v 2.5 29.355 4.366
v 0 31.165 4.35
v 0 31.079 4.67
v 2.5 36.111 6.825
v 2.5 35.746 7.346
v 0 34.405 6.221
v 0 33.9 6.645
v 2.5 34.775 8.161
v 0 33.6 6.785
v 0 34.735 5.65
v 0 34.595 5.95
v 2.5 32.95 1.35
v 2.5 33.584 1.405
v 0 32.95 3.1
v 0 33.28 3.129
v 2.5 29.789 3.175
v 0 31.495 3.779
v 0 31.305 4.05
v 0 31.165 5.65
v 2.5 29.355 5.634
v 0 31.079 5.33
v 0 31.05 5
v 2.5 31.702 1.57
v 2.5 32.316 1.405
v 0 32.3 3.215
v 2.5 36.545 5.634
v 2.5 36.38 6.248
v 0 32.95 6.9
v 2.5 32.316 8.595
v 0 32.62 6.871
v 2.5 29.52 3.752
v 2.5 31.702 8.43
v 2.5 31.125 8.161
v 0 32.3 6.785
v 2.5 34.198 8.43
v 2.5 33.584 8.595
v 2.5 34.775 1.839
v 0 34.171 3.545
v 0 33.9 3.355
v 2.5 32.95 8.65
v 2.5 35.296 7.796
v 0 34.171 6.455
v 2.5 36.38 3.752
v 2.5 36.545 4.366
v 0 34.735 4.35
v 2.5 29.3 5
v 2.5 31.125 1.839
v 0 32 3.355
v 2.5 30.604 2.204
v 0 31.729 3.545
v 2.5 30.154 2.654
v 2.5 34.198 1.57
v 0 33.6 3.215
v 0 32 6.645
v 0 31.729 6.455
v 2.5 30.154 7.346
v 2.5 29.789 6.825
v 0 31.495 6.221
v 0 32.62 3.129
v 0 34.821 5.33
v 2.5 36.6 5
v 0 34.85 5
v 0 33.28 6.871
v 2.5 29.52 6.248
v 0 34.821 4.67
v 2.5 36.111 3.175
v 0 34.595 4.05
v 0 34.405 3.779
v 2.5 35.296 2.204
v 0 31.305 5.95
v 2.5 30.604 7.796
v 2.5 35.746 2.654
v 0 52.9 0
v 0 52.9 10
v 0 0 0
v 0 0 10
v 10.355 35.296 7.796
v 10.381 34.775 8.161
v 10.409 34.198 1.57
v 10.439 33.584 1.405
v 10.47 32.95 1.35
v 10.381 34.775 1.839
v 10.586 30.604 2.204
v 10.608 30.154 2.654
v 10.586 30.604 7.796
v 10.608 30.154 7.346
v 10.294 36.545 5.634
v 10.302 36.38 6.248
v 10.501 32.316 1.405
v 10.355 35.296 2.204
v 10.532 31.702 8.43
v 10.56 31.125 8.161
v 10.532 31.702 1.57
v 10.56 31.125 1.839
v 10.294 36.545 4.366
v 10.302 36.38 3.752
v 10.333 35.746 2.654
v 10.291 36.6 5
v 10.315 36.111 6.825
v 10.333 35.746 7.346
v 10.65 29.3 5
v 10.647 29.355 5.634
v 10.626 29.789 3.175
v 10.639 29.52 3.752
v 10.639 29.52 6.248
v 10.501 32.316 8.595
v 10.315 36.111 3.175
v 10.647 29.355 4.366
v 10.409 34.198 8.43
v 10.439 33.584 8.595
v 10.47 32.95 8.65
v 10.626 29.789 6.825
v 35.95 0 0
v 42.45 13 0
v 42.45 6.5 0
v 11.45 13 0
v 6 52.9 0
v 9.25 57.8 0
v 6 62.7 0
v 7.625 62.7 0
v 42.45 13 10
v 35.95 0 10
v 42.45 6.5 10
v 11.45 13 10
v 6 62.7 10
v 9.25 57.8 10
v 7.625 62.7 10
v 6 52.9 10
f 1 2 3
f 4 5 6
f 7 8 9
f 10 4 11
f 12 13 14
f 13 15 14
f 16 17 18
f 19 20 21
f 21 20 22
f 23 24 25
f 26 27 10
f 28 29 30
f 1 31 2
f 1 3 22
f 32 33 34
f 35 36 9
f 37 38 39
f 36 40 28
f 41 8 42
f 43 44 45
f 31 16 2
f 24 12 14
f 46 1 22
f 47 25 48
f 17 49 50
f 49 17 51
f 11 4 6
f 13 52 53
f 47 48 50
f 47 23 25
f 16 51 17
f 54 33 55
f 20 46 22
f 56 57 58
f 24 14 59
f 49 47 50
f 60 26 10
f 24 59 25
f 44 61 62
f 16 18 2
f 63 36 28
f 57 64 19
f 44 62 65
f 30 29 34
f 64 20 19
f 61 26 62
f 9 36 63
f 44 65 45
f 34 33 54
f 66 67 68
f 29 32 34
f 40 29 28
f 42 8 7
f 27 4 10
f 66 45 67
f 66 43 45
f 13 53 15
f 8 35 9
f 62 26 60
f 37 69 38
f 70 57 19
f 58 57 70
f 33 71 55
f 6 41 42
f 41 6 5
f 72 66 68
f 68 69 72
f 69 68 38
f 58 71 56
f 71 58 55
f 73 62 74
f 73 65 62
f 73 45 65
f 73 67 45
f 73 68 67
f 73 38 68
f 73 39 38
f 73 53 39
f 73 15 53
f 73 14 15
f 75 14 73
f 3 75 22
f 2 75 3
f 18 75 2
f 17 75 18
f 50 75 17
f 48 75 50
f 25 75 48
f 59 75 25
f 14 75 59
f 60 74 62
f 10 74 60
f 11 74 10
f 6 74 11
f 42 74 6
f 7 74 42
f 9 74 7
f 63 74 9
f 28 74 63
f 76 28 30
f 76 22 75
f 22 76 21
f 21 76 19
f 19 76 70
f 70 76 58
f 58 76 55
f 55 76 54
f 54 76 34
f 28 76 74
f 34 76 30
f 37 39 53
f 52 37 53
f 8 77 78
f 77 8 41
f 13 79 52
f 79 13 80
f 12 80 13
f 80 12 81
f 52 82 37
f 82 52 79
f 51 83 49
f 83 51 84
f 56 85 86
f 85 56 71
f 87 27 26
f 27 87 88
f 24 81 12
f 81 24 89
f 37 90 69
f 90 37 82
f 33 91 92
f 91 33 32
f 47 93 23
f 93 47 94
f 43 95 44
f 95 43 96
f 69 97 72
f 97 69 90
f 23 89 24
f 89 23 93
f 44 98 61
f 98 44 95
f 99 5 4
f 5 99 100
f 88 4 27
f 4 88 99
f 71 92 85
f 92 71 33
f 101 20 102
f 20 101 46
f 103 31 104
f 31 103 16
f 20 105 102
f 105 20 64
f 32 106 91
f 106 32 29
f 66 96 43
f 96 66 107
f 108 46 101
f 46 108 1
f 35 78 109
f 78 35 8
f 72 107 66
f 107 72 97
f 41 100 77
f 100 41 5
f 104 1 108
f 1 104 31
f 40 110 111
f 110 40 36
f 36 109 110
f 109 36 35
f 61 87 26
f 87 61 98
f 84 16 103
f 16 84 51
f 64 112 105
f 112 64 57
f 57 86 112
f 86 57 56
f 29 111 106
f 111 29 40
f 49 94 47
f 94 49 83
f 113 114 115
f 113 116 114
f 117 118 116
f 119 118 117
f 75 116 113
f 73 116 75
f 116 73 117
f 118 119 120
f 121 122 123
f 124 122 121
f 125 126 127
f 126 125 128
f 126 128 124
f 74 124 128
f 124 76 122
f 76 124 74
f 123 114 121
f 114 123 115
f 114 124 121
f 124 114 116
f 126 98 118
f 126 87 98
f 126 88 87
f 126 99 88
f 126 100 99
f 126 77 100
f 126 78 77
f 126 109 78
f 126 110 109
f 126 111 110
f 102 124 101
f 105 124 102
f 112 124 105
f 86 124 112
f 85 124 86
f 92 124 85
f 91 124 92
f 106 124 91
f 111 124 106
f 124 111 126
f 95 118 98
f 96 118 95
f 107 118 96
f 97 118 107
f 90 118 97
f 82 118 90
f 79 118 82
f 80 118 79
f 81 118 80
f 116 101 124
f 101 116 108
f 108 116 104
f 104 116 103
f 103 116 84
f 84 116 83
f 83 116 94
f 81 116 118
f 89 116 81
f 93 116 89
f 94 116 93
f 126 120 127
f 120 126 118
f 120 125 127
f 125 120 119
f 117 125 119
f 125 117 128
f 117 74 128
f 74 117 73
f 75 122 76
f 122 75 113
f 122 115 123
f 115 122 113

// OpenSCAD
/*
————————————————————————————————————————————————————————————————————————————————
CONFIG
————————————————————————————————————————————————————————————————————————————————
*/

// bin measurements (draw technincal image)
binHeight = 52;
binWidth = 102;
binLength = 93;
binLengthBackFloorOffset = 2.2; // should be angle. 0 for straight.

// Chanfer of the bin
binChanferHeight = 7.5;
binChanferHeightThickness = 2.3;
binChanferLengthThickness = 3;
binChanferLengthInternal = 6.5 - binChanferLengthThickness;
binChanferWidth = 10; // 70; // should be minor than binWidth

// Holes
screwHeadDiameter = 6.8;
screwHeadHeight = 2.5; // 0 for flat, > 0 for conical head
screwShankDiameter = 3.3;
screwShankLength = 0;
screwSpacing = 0.25; // extra space for the screw hole
screwQuantity = [1, 1];

// Misc
$fn=360 / 10;
renderTransp = 1;
renderColorPolygon = "blue";
renderColorHoles = "red";
// bleedOffset = 0.25; // tolerance

// Auto-calculated, minor measurements
originX = 0;
originY = 0;
baseHeight = binHeight / 4;
supportChanferHoleLengthAdditional = binChanferLengthThickness * 1;
supportChanferTeethSafeLengthIncrease = 0.25;
supportChanferTeethLengthOffset = 5; // should be angle. 0 for straight.
supportBaseLength = binLength / 3;




/*
————————————————————————————————————————————————————————————————————————————————
MODULES
————————————————————————————————————————————————————————————————————————————————
*/

module start(){
	echo("Script start");

	// Axis indexes
	xA = originX;
	xB = xA;

	xC = xA + binChanferLengthThickness + supportChanferHoleLengthAdditional;
	xD = xC;
	xF = xC + binChanferLengthInternal - supportChanferTeethSafeLengthIncrease;
	xE = xF - ( ( binChanferLengthInternal - supportChanferTeethSafeLengthIncrease ) / 2);
	xG = xF + binLengthBackFloorOffset;
	xH = xG + supportBaseLength;
	xI = xH;
	xJ = xH - (baseHeight / 2);

	yA = originY;
	yJ = yA;
	yH = yA + baseHeight;
	yG = yH;
	yI = yA + yH - (baseHeight / 2);
	yD = yA + baseHeight + binHeight - binChanferHeightThickness;
	yE = yD;
	yB = yD - binChanferHeight - binChanferHeightThickness;
	yC = yB;
	yF = yC + ( (yD - yC) / 2 ); // 
	echo("Axis indexes generated");

	// drawing vector
	dv = [
		[xA, yA],
		[xB, yB],
		[xC, yC],
		[xD, yD],
		[xE, yE],
		[xF, yF],
		[xG, yG],
		[xH, yH],
		[xI, yI],
		[xJ, yJ],
	];
	echo("Drawing vector done");


	// screw holes
	sxA = originX;
	sxB = sxA + screwShankLength;
	sxC = sxB + screwHeadHeight;
	sxD = xG;

	screwQuantityHorizontal = screwQuantity[0] > 0 ? screwQuantity[0] : 0;
	holeHorizontalSpacing = binChanferWidth / (screwQuantityHorizontal + 1);

	holeVerticalOrigin = yG;
	holeVerticalEnd = yB;
	screwQuantityVertical = screwQuantity[1] > 0 ? screwQuantity[1] : 0;
	holeVerticalSpacing = ( holeVerticalEnd - holeVerticalOrigin ) / (screwQuantityVertical + 1);


	difference(){
		monoblock(binChanferWidth, dv);

		for (
			iH = [0 : screwQuantityHorizontal - 1]
		){
			for (
				jV = [0 : screwQuantityVertical - 1]
			){
				translate([
					0,
					holeVerticalOrigin + ( holeVerticalSpacing * (jV + 1) ),
					holeHorizontalSpacing * (iH + 1)
				]){
					rotate([0, 90, 0]){
						// Hole (to be modulerized)
						union(){
							color(renderColorHoles, renderTransp) cylinder(
								h = screwShankLength,
								r = ( screwShankDiameter / 2 ) + screwSpacing,
								center = false
							);
							translate([
								0, 0, screwShankLength
							]){
								color(renderColorHoles, renderTransp) cylinder(
									h = screwHeadHeight,
									r1 = ( screwShankDiameter / 2 ) + screwSpacing,
									r2 = ( screwHeadDiameter / 2) + screwSpacing,
									center = false
								);
							}
							translate([
								0, 0, screwShankLength + screwHeadHeight
							]){
								color(renderColorHoles, renderTransp) cylinder(
									h = xG - xA,
									r = ( screwHeadDiameter / 2) + screwSpacing,
									center = false
								);
							}
						}
						echo("Polygon drilled");
					}
				}
			}
		}
	}
}

module monoblock(h, dv){
	linear_extrude(
		height = h
	) {
		color(renderColorPolygon, renderTransp) polygon(dv);
		echo("Polygon 2D");
	}
	echo("Polygon extruded");
}



/*
————————————————————————————————————————————————————————————————————————————————
BOOTSTRAP
————————————————————————————————————————————————————————————————————————————————
*/
start();
